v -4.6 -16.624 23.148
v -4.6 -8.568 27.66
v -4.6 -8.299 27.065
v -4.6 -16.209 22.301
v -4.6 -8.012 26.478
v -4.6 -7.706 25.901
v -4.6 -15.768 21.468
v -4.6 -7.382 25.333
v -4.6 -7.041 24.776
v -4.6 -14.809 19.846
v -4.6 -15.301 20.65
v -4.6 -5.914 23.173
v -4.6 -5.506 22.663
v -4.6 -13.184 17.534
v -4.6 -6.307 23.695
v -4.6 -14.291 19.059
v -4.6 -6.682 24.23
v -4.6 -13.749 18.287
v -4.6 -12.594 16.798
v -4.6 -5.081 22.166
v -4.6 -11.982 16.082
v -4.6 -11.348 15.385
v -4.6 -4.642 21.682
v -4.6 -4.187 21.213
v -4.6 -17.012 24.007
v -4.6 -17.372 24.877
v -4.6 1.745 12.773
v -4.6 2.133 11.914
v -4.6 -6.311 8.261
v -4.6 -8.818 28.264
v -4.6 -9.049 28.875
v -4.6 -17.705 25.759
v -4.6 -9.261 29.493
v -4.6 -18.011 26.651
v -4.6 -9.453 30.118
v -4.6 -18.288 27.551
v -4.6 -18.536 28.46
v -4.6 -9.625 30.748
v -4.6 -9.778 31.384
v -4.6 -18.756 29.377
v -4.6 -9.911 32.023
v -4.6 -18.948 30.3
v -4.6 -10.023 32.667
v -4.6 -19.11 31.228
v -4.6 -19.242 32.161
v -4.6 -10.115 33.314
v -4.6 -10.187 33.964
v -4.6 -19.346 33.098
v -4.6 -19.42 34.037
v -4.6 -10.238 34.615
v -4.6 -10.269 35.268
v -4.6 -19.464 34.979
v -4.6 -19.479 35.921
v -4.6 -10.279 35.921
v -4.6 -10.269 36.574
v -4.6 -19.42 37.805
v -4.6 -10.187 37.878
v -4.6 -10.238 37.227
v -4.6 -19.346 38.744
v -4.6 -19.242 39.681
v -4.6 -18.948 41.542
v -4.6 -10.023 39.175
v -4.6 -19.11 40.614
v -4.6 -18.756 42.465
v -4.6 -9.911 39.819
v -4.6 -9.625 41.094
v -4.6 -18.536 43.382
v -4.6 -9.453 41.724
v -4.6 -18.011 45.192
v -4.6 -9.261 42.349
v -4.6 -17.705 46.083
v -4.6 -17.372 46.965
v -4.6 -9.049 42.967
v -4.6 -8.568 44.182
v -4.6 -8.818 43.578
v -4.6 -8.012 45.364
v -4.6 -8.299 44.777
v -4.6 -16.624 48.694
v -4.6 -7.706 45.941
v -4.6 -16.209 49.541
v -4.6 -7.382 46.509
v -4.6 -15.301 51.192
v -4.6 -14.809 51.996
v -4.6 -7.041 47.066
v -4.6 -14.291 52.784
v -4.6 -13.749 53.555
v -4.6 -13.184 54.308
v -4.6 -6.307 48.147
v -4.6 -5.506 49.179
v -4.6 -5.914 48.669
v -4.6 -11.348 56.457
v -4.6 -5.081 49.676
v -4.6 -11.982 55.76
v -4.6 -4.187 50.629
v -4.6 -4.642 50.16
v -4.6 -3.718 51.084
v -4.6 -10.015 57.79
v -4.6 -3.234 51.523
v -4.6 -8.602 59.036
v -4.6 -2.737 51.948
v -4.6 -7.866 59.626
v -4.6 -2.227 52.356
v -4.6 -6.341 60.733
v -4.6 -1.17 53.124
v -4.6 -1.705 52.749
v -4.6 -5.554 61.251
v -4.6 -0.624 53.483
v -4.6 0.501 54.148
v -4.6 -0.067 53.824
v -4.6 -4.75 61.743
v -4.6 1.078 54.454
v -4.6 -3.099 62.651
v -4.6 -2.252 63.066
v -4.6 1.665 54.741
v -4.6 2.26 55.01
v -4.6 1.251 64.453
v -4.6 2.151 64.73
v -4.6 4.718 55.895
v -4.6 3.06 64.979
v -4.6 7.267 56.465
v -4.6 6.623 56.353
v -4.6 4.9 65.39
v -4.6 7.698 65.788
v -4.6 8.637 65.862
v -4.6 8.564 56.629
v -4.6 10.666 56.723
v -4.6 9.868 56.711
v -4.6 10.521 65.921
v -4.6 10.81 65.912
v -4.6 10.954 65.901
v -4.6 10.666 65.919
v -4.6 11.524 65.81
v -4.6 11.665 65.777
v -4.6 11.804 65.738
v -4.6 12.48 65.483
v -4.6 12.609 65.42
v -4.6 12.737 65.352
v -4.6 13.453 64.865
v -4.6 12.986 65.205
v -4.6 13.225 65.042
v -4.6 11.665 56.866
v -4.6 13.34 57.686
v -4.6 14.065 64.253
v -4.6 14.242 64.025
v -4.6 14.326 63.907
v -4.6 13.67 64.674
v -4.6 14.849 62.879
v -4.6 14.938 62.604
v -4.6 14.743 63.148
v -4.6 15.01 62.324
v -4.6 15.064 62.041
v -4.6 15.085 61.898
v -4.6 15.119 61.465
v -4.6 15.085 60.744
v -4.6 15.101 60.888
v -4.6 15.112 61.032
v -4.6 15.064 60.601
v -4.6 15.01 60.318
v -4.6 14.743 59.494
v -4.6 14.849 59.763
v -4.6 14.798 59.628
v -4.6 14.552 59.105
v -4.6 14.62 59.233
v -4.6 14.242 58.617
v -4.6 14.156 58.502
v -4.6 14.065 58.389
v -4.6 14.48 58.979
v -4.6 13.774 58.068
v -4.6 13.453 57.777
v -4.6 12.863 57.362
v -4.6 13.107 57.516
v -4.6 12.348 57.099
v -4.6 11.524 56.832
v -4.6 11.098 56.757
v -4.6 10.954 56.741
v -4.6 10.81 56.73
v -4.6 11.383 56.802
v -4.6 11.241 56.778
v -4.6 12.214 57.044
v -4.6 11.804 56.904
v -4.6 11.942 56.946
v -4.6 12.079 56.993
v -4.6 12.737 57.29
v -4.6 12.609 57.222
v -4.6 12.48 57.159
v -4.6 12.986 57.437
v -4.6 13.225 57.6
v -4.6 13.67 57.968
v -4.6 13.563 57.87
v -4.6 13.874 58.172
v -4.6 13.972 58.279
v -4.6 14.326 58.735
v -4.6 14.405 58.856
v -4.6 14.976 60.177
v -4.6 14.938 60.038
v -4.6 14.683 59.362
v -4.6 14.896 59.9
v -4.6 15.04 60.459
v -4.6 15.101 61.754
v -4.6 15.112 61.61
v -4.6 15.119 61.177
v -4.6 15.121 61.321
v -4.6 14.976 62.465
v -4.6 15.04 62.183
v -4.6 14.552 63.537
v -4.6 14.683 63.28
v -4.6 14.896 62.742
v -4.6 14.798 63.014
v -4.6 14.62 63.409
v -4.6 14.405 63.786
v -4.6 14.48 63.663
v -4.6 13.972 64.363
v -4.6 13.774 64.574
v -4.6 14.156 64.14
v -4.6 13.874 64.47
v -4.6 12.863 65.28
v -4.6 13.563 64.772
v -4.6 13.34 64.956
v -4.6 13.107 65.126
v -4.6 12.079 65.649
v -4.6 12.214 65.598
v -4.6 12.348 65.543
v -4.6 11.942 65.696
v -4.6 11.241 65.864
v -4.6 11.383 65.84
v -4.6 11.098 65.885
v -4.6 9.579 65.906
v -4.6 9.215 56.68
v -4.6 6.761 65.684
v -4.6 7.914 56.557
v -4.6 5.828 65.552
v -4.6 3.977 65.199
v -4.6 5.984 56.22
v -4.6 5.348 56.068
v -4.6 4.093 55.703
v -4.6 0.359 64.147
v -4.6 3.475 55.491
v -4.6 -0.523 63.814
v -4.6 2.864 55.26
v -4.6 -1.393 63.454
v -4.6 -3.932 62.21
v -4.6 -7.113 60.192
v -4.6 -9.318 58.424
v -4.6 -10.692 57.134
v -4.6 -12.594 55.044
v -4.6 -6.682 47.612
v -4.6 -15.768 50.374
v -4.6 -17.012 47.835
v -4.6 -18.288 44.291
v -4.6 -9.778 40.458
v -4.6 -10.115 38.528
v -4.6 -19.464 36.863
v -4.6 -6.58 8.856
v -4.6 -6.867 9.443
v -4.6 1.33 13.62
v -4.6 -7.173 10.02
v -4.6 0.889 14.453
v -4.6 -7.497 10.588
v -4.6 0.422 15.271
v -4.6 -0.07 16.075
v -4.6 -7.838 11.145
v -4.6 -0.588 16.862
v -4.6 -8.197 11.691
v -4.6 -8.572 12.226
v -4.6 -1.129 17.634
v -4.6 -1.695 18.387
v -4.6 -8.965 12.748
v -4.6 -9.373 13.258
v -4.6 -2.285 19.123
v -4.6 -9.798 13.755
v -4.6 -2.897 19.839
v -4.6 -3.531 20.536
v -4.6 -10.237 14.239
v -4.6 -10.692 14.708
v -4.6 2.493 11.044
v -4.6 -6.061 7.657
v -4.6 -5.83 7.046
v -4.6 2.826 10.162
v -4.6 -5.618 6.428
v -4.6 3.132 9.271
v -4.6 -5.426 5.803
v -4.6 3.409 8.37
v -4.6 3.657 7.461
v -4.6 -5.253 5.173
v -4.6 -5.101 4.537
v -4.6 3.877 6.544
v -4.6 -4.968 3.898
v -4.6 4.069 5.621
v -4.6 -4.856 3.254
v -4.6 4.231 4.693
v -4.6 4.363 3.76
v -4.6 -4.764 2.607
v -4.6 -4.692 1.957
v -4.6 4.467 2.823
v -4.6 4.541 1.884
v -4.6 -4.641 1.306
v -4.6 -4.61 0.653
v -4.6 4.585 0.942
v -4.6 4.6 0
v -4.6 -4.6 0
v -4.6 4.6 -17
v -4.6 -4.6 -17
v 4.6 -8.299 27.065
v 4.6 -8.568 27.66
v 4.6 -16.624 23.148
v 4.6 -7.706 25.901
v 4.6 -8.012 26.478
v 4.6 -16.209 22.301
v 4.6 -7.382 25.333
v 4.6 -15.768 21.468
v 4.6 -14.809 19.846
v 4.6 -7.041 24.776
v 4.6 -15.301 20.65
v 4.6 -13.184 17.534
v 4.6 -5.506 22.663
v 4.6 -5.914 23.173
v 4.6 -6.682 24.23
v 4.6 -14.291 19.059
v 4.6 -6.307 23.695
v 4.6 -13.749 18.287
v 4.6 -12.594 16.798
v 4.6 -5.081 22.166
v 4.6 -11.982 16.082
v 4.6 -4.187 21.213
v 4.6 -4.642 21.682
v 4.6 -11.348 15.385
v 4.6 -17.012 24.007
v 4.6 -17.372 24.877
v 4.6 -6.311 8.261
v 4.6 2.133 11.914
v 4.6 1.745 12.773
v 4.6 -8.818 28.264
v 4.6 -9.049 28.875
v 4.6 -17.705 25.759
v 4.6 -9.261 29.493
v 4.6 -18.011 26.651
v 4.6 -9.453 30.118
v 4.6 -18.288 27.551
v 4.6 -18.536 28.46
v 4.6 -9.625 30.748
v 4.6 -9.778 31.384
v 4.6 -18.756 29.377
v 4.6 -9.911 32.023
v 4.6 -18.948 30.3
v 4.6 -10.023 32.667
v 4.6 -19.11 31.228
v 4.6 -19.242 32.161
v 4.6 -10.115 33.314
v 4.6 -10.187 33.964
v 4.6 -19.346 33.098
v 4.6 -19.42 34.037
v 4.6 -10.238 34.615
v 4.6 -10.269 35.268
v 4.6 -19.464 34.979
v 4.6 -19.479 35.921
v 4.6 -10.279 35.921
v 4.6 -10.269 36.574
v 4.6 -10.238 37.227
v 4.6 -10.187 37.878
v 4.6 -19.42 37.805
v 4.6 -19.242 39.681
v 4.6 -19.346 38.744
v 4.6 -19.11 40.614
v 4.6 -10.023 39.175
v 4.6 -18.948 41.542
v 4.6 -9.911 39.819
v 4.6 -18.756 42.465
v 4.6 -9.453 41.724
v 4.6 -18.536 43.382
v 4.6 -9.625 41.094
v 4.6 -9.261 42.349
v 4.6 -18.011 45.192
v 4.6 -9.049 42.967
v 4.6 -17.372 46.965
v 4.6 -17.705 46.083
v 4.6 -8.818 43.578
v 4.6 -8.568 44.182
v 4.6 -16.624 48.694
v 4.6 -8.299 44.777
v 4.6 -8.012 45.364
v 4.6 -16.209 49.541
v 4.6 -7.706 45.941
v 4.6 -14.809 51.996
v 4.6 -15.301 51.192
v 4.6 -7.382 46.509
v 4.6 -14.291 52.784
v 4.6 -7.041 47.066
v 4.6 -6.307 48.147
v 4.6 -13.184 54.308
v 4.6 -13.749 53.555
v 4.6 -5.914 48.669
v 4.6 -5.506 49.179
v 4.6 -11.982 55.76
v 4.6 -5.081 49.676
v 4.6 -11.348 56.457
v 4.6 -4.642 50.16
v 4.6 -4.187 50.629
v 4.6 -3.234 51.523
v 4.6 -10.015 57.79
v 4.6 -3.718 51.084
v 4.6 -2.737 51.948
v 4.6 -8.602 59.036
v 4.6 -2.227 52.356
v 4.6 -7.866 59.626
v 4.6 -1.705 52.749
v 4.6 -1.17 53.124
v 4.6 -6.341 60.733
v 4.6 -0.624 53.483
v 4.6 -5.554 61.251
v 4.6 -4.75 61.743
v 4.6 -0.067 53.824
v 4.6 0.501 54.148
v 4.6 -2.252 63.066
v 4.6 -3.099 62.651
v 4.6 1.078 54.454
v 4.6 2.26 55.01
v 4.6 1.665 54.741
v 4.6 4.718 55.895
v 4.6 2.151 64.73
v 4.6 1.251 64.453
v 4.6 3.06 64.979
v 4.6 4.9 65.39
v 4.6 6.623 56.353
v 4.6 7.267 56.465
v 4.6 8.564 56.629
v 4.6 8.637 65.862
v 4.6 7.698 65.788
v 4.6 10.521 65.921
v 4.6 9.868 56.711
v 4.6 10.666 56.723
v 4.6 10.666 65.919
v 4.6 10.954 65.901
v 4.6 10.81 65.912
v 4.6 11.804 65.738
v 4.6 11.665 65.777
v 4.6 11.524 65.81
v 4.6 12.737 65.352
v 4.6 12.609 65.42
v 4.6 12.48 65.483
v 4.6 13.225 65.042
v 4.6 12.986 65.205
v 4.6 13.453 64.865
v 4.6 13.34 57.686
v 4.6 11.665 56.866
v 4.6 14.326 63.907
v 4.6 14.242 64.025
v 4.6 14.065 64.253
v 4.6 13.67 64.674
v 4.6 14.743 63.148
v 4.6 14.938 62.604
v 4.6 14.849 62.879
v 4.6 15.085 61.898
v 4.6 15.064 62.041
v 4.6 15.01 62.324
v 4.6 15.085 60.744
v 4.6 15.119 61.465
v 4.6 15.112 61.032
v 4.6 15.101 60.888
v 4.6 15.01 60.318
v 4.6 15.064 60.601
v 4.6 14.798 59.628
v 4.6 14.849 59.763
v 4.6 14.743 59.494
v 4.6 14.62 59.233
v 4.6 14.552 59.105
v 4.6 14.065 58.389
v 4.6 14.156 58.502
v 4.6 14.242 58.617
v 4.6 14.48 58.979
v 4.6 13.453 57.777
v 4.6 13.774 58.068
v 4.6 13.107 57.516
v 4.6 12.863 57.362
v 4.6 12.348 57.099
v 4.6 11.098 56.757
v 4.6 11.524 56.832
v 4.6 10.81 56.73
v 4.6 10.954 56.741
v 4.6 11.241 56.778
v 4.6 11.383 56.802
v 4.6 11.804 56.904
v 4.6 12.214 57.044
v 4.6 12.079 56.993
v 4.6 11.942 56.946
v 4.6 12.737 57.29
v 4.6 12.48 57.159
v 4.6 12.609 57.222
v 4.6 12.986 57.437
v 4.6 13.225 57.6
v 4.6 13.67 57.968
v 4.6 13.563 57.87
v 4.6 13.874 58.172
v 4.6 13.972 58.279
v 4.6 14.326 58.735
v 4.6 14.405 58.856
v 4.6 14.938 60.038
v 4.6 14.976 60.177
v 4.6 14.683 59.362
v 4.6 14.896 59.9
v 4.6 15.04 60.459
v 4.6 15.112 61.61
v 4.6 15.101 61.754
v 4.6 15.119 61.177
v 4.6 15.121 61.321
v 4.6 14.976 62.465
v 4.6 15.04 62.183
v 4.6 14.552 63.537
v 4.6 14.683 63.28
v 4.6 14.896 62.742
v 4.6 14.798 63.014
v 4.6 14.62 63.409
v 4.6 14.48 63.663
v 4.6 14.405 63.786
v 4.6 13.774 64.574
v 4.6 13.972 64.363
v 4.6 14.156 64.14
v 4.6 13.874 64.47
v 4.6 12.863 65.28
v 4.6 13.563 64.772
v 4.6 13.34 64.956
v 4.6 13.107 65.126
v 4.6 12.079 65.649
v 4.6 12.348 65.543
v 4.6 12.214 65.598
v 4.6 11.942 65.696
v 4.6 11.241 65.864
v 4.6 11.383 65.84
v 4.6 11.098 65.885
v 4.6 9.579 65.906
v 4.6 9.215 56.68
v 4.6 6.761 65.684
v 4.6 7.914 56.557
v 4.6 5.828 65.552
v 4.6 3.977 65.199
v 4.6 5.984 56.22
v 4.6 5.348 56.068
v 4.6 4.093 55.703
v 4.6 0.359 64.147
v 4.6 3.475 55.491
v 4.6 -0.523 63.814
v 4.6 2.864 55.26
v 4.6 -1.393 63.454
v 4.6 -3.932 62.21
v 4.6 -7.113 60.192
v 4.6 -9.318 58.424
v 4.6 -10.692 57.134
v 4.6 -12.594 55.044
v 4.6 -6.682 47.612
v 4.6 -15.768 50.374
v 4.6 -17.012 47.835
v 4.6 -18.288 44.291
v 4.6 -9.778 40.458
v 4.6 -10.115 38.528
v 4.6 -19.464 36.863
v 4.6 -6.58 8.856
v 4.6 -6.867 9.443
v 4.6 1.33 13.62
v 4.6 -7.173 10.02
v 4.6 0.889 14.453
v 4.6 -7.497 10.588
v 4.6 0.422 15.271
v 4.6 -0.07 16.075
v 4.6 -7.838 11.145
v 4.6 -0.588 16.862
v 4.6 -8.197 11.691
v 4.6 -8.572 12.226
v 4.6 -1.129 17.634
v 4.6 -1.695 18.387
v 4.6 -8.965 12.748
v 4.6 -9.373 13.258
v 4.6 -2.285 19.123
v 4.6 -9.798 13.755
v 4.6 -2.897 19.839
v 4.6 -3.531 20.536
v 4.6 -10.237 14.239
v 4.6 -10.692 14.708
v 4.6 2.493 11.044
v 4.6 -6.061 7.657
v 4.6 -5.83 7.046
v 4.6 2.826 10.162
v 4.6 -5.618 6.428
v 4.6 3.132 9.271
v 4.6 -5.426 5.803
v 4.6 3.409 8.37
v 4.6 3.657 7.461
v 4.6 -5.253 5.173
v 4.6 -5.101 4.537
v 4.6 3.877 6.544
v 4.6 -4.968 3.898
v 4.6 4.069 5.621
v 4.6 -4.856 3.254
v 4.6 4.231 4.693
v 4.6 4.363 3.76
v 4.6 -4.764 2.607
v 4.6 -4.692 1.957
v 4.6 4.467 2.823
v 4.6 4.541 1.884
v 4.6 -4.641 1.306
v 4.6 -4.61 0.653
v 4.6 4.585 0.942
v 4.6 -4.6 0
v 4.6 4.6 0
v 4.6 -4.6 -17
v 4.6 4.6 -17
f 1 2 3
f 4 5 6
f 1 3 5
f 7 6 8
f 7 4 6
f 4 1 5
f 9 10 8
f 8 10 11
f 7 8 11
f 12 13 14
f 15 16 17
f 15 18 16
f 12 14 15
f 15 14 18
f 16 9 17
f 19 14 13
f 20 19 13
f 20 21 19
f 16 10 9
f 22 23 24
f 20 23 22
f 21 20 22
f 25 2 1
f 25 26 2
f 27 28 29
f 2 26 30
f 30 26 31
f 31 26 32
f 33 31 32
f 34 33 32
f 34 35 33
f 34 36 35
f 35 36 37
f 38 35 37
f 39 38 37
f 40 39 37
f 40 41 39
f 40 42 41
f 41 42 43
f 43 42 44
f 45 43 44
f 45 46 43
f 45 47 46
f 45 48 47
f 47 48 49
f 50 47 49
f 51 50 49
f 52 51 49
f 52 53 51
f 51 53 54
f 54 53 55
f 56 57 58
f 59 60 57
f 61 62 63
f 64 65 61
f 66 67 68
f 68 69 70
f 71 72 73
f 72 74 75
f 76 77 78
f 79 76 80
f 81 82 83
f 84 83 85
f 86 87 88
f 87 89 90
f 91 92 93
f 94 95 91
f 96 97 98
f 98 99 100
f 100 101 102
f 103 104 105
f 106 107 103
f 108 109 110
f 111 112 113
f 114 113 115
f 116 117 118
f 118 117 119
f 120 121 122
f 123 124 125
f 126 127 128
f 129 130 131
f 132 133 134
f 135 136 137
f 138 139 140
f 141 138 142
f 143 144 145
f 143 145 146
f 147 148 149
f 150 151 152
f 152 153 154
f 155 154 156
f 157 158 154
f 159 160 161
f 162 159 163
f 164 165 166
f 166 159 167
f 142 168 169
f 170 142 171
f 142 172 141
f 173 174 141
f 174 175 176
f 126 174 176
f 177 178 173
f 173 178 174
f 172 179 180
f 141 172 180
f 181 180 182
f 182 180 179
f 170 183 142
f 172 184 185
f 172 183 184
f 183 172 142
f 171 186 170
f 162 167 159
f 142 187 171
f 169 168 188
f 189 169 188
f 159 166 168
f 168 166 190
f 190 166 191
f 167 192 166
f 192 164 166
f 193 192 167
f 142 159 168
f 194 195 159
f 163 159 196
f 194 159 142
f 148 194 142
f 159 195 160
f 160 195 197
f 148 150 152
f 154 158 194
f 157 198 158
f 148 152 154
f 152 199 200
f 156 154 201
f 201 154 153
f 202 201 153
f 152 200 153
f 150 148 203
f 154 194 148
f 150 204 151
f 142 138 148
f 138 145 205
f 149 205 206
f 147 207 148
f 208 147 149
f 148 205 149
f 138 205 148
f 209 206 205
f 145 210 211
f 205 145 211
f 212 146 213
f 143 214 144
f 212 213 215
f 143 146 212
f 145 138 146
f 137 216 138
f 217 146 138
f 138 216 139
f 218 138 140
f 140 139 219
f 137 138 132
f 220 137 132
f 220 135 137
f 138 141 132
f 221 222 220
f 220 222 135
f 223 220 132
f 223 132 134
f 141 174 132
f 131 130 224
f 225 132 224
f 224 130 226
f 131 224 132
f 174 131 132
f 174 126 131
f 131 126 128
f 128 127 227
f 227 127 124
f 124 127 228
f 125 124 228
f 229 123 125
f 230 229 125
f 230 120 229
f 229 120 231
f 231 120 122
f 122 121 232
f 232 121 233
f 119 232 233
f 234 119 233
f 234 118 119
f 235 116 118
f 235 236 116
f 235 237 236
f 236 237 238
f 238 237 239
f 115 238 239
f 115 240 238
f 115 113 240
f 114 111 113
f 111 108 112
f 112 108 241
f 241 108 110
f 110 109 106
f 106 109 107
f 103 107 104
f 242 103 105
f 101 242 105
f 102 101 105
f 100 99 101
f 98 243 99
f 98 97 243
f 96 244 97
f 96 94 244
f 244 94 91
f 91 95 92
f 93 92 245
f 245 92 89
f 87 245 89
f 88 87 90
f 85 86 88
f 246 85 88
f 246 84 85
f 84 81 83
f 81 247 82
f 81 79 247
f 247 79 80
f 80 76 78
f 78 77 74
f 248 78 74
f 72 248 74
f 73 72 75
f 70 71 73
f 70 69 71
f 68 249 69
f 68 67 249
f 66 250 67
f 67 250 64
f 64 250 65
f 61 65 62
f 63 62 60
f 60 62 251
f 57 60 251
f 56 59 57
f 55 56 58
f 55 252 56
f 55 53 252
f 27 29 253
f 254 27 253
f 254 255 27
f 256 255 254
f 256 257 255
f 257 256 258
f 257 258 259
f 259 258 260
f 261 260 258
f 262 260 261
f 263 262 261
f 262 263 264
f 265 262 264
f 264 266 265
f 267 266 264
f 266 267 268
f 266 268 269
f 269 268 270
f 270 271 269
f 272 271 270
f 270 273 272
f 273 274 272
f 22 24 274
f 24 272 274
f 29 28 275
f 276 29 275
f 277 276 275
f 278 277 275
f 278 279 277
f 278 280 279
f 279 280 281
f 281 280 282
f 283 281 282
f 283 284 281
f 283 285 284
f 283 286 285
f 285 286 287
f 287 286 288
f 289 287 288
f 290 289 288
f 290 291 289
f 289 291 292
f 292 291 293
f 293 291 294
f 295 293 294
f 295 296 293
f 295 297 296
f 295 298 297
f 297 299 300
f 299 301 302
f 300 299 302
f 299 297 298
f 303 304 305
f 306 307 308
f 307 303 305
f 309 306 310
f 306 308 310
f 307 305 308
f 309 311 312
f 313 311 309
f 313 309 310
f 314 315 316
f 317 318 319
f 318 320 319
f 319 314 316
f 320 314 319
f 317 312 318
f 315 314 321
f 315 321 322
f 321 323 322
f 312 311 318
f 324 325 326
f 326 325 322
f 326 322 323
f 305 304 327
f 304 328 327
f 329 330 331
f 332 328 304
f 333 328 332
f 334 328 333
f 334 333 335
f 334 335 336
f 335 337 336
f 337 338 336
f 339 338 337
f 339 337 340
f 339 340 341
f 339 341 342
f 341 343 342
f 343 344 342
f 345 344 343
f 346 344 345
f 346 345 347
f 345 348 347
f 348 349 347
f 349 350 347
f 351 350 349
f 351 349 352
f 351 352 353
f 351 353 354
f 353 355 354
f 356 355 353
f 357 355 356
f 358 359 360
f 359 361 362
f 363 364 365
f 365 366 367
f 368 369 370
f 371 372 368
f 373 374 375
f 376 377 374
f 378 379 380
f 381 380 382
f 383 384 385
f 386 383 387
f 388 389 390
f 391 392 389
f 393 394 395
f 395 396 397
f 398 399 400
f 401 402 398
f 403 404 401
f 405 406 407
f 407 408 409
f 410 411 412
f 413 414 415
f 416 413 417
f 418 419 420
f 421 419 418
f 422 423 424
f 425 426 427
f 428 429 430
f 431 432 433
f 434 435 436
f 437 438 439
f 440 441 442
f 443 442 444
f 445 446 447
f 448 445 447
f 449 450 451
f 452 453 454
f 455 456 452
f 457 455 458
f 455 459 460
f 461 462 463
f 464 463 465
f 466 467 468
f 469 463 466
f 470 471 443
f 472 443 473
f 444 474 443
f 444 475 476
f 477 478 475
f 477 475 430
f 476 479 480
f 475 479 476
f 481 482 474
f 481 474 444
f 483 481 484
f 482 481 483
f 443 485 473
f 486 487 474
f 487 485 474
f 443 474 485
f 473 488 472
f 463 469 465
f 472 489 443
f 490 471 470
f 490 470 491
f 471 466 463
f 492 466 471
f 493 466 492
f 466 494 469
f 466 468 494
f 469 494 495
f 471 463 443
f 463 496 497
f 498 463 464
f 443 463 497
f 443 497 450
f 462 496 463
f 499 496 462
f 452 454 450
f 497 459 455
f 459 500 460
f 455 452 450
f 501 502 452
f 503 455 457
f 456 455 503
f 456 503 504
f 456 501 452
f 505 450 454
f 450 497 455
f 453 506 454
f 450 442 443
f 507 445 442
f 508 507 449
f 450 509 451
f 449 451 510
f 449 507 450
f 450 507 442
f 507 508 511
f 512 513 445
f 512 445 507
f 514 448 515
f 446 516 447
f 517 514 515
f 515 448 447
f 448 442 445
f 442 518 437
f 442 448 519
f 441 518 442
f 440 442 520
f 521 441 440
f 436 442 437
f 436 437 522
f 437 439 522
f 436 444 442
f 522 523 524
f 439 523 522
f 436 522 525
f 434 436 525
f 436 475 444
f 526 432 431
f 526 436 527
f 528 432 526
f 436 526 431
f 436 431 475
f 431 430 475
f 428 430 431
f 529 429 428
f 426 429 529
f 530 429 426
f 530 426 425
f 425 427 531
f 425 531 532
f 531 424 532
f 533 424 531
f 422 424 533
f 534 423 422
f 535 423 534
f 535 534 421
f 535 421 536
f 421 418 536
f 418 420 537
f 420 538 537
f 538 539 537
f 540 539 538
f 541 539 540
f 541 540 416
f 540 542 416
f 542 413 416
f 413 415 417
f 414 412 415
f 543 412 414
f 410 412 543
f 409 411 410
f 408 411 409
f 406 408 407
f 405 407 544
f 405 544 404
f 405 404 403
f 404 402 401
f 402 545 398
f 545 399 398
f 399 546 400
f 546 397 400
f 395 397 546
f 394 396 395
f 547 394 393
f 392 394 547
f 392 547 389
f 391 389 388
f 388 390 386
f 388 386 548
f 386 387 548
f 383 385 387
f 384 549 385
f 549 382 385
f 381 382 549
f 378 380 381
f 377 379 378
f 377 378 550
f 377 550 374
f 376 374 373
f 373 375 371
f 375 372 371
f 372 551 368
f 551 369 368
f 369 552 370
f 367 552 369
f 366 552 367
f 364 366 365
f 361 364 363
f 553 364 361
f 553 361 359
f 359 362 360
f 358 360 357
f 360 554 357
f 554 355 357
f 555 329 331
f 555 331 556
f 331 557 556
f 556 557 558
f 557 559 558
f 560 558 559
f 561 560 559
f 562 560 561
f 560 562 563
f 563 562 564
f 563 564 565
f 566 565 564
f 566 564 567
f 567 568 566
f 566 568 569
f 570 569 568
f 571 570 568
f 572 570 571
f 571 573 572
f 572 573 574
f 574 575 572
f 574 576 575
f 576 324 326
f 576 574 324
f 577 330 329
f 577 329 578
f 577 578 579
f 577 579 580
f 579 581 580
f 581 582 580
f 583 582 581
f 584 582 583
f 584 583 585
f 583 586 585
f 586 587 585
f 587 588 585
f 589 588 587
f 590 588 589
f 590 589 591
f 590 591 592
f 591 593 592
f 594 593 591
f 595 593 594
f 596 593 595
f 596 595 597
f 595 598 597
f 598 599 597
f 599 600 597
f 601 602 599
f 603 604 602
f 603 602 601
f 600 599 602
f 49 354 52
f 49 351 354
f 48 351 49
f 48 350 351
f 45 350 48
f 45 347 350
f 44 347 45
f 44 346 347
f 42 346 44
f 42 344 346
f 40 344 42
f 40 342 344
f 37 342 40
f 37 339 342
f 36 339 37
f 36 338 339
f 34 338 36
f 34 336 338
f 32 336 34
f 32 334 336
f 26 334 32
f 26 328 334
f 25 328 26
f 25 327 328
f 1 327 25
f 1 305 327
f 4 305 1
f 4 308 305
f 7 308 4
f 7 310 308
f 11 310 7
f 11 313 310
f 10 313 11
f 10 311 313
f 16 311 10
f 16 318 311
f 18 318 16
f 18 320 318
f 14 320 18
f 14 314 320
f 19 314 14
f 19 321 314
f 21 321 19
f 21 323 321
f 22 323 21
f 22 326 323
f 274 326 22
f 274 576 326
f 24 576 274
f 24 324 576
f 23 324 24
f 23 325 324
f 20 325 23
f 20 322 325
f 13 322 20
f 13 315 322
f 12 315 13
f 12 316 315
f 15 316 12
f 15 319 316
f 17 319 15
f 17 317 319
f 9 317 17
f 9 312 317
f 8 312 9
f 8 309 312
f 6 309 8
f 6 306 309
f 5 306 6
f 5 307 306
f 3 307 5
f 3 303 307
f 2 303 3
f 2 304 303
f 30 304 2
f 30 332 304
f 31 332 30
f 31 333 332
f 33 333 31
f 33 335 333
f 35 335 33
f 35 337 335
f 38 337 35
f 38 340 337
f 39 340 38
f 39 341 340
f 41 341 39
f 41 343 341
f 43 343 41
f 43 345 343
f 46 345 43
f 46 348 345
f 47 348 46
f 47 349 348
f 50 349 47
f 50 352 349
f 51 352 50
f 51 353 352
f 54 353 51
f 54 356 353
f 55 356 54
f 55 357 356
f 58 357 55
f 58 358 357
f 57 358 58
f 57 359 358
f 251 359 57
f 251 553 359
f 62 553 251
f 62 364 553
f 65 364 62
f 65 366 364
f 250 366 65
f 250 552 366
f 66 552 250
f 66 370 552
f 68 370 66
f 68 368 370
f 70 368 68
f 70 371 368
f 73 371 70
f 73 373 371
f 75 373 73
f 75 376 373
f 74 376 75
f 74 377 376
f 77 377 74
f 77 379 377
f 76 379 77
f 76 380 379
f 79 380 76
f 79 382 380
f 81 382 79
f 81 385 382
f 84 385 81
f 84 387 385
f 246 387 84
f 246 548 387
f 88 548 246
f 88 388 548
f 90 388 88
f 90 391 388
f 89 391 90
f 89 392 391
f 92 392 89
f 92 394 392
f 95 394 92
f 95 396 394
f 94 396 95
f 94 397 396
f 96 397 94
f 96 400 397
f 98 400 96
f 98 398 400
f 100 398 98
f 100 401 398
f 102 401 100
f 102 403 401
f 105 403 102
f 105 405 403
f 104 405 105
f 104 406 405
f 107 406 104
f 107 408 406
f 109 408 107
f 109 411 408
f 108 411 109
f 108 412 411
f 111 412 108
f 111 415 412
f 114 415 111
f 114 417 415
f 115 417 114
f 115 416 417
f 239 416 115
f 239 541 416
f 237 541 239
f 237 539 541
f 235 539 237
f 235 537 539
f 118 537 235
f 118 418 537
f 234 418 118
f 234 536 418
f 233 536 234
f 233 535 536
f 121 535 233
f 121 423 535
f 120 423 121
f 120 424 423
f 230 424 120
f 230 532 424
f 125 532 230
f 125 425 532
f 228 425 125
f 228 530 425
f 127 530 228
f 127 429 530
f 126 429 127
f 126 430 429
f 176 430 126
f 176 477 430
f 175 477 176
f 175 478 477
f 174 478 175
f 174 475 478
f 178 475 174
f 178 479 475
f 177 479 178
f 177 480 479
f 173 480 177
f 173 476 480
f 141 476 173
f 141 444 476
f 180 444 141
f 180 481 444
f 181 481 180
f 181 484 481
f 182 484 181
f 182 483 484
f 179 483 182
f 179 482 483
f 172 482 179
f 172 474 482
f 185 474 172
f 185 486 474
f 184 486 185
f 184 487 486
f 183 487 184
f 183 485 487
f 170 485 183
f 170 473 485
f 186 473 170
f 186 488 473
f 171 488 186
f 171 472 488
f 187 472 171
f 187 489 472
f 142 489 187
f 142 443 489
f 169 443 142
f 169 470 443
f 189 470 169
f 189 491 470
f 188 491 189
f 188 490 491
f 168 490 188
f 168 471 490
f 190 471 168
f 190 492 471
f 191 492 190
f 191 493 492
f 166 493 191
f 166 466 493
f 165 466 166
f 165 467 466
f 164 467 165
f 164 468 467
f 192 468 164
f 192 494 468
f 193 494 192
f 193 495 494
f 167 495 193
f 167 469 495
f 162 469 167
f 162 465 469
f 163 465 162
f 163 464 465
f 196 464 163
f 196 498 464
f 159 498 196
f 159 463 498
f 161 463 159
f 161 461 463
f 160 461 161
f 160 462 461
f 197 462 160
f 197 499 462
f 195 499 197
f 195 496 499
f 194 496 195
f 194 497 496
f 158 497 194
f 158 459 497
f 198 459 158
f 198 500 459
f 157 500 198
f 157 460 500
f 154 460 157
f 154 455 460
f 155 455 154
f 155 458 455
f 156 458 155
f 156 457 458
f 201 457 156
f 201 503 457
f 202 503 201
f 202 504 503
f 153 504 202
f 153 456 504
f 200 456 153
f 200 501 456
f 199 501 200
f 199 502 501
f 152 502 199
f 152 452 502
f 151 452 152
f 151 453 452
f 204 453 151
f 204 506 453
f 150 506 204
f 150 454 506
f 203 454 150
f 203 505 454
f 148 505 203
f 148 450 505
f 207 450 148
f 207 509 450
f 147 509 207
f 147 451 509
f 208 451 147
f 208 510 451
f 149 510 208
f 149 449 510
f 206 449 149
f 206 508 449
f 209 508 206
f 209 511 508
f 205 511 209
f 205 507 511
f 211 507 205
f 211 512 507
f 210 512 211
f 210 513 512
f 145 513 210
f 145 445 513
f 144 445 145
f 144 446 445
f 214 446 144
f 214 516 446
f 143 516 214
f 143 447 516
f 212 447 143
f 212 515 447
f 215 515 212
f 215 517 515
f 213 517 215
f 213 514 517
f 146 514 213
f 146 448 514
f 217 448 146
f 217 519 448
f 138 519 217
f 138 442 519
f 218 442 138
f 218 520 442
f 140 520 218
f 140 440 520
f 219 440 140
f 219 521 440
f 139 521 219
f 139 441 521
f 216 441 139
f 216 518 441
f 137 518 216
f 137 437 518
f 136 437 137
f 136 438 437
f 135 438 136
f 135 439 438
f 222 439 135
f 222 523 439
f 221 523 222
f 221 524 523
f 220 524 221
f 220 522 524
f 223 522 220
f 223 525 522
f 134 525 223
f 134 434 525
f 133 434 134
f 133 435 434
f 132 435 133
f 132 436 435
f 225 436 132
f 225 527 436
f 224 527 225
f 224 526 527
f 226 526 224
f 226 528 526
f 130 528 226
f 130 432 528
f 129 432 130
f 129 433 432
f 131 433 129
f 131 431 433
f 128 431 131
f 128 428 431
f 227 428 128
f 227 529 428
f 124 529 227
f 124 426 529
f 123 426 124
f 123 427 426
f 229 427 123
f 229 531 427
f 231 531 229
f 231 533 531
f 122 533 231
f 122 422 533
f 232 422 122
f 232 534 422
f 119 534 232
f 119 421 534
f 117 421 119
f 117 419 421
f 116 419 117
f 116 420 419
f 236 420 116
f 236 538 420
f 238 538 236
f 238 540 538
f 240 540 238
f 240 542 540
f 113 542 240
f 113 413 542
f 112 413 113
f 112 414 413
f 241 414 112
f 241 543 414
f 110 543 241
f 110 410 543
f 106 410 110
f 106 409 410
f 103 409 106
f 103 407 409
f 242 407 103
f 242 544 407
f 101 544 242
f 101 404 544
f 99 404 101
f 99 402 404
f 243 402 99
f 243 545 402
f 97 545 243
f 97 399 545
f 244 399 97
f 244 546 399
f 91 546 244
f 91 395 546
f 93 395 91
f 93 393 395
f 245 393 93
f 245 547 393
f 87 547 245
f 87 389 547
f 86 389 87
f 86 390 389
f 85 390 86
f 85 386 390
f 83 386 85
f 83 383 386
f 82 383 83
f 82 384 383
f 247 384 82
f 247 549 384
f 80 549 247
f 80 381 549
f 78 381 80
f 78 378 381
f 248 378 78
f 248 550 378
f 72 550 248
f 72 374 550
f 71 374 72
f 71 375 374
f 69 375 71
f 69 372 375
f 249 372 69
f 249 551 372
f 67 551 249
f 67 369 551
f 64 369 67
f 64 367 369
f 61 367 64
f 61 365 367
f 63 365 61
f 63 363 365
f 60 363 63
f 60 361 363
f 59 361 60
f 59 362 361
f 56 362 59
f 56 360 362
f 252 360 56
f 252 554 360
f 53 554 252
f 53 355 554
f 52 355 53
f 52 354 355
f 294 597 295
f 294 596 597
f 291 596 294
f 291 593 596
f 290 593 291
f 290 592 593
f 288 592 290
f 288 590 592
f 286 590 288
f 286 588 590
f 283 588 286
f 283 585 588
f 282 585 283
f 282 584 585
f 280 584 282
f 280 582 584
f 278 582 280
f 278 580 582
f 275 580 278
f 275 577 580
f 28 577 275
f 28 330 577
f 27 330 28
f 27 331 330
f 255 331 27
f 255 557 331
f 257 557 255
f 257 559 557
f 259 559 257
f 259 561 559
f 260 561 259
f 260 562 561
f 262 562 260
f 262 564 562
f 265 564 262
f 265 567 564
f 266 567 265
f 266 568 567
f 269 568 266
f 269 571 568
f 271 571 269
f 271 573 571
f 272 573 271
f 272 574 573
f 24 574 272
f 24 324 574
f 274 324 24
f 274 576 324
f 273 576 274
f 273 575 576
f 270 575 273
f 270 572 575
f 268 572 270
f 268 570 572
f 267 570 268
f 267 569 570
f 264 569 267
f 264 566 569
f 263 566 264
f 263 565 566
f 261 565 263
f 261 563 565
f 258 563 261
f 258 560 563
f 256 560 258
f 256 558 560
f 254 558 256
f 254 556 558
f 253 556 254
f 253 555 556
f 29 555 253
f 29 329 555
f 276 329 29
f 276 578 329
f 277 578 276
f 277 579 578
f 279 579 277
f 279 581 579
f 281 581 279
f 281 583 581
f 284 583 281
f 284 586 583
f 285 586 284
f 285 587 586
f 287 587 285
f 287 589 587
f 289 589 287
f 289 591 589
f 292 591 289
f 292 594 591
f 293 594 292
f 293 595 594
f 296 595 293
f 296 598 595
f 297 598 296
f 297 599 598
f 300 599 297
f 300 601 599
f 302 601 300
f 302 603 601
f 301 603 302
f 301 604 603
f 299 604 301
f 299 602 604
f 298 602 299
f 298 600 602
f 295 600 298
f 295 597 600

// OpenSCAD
t_h = 17;
t_a = 32;
t_b = 14;
t_z = 15;
t_d = 15;
t_p = 2;
t_p_s = 1.2;
t_p_h_a = 10;
t_p_h_b = 10;
t_p_h_p = 0.92;
t_p_h_a_t = t_p_h_p * t_p_h_a;
t_p_h_b_t = t_p_h_p * t_p_h_b;
t_p_h_h = 0;
t_b_s = 0.85;
t2_h = 0.98 * (t_z + t_p);
t2_s = 0.98 * t_b_s;
h_r = 30;
s_h_s = 0.5;

module trapezoid() {
  translate([0, t_h/2, 0]) {
    minkowski() {
      polygon([
        [-t_a/2 + t_d/2.5, -t_d/4],
        [t_a/2 - t_d/2.5, -t_d/4],
        [t_b/2 - t_d/6.5, -t_h + t_d/4],
        [-t_b/2 + t_d/6.5, -t_h + t_d/4]
      ]);
      circle(d = t_d/2, $fn = 200);
    }
  }
}

module plate_cutout() {
  translate([0, t_p_h_h]) {
    square([t_p_h_b, t_p_h_a], center = true);
  }
}

module plate() {
  linear_extrude(height = t_p) {
    difference() {
      scale([t_p_s, t_p_s]) {
        trapezoid();
      }
      plate_cutout();
    }
  }
}

module front_face() {
  rotate([0, 180, 0]) {
    linear_extrude(height = t_z) {
      difference() {
        trapezoid();
        scale([t_b_s, t_b_s]) {
          trapezoid();
        }
      }
    }
  }
  plate();
}

module back_face() {
  translate([0, 0, -t_z - t_p]) {
    rotate([0, 0, 0]) {
      plate();
      linear_extrude(height = t2_h) {
        difference() {
          scale([t2_s, t2_s]) {
            trapezoid();
          }
          plate_cutout();
        }
      }
    }
  }
}

module hook_profile() {
  square([t_p + t_z, t_p_h_a_t]);
  translate([0, t_p_h_a_t - h_r]) {
    intersection() {
      difference() {
        circle(r = h_r, $fn = 200);
        circle(r = h_r - t_p_h_a_t, $fn = 200);
      }
      polygon([[0, 0], [-h_r, h_r], [0, h_r]]);
    }
  }
  translate([(t_p_h_a_t - 2*h_r)/sqrt(2), t_p_h_a_t - h_r + (2*h_r - t_p_h_a_t)/sqrt(2)]) {
    intersection() {
      difference() {
        circle(r = h_r, $fn = 200);
        circle(r = h_r - t_p_h_a_t, $fn = 200);
      }
      polygon([[0, 0], [h_r, -h_r], [-h_r, -h_r], [-h_r, 0]]);
    }
  }
  translate([(t_p_h_a_t - 2*h_r)/sqrt(2) - h_r + t_p_h_a_t/2, t_p_h_a_t - h_r + (2*h_r - t_p_h_a_t)/sqrt(2)]) {
    circle(d = t_p_h_a_t, $fn = 200);
  }
}

module hook() {
  rotate([0, 90, 0]) {
    translate([0, -t_p_h_a_t/2, -t_p_h_a_t/2]) {
      linear_extrude(height = t_p_h_b_t) {
        hook_profile();
      }
    }
  }
}

//color("Orange") front_face();
//color("Yellow") back_face();
color("Red") hook();
